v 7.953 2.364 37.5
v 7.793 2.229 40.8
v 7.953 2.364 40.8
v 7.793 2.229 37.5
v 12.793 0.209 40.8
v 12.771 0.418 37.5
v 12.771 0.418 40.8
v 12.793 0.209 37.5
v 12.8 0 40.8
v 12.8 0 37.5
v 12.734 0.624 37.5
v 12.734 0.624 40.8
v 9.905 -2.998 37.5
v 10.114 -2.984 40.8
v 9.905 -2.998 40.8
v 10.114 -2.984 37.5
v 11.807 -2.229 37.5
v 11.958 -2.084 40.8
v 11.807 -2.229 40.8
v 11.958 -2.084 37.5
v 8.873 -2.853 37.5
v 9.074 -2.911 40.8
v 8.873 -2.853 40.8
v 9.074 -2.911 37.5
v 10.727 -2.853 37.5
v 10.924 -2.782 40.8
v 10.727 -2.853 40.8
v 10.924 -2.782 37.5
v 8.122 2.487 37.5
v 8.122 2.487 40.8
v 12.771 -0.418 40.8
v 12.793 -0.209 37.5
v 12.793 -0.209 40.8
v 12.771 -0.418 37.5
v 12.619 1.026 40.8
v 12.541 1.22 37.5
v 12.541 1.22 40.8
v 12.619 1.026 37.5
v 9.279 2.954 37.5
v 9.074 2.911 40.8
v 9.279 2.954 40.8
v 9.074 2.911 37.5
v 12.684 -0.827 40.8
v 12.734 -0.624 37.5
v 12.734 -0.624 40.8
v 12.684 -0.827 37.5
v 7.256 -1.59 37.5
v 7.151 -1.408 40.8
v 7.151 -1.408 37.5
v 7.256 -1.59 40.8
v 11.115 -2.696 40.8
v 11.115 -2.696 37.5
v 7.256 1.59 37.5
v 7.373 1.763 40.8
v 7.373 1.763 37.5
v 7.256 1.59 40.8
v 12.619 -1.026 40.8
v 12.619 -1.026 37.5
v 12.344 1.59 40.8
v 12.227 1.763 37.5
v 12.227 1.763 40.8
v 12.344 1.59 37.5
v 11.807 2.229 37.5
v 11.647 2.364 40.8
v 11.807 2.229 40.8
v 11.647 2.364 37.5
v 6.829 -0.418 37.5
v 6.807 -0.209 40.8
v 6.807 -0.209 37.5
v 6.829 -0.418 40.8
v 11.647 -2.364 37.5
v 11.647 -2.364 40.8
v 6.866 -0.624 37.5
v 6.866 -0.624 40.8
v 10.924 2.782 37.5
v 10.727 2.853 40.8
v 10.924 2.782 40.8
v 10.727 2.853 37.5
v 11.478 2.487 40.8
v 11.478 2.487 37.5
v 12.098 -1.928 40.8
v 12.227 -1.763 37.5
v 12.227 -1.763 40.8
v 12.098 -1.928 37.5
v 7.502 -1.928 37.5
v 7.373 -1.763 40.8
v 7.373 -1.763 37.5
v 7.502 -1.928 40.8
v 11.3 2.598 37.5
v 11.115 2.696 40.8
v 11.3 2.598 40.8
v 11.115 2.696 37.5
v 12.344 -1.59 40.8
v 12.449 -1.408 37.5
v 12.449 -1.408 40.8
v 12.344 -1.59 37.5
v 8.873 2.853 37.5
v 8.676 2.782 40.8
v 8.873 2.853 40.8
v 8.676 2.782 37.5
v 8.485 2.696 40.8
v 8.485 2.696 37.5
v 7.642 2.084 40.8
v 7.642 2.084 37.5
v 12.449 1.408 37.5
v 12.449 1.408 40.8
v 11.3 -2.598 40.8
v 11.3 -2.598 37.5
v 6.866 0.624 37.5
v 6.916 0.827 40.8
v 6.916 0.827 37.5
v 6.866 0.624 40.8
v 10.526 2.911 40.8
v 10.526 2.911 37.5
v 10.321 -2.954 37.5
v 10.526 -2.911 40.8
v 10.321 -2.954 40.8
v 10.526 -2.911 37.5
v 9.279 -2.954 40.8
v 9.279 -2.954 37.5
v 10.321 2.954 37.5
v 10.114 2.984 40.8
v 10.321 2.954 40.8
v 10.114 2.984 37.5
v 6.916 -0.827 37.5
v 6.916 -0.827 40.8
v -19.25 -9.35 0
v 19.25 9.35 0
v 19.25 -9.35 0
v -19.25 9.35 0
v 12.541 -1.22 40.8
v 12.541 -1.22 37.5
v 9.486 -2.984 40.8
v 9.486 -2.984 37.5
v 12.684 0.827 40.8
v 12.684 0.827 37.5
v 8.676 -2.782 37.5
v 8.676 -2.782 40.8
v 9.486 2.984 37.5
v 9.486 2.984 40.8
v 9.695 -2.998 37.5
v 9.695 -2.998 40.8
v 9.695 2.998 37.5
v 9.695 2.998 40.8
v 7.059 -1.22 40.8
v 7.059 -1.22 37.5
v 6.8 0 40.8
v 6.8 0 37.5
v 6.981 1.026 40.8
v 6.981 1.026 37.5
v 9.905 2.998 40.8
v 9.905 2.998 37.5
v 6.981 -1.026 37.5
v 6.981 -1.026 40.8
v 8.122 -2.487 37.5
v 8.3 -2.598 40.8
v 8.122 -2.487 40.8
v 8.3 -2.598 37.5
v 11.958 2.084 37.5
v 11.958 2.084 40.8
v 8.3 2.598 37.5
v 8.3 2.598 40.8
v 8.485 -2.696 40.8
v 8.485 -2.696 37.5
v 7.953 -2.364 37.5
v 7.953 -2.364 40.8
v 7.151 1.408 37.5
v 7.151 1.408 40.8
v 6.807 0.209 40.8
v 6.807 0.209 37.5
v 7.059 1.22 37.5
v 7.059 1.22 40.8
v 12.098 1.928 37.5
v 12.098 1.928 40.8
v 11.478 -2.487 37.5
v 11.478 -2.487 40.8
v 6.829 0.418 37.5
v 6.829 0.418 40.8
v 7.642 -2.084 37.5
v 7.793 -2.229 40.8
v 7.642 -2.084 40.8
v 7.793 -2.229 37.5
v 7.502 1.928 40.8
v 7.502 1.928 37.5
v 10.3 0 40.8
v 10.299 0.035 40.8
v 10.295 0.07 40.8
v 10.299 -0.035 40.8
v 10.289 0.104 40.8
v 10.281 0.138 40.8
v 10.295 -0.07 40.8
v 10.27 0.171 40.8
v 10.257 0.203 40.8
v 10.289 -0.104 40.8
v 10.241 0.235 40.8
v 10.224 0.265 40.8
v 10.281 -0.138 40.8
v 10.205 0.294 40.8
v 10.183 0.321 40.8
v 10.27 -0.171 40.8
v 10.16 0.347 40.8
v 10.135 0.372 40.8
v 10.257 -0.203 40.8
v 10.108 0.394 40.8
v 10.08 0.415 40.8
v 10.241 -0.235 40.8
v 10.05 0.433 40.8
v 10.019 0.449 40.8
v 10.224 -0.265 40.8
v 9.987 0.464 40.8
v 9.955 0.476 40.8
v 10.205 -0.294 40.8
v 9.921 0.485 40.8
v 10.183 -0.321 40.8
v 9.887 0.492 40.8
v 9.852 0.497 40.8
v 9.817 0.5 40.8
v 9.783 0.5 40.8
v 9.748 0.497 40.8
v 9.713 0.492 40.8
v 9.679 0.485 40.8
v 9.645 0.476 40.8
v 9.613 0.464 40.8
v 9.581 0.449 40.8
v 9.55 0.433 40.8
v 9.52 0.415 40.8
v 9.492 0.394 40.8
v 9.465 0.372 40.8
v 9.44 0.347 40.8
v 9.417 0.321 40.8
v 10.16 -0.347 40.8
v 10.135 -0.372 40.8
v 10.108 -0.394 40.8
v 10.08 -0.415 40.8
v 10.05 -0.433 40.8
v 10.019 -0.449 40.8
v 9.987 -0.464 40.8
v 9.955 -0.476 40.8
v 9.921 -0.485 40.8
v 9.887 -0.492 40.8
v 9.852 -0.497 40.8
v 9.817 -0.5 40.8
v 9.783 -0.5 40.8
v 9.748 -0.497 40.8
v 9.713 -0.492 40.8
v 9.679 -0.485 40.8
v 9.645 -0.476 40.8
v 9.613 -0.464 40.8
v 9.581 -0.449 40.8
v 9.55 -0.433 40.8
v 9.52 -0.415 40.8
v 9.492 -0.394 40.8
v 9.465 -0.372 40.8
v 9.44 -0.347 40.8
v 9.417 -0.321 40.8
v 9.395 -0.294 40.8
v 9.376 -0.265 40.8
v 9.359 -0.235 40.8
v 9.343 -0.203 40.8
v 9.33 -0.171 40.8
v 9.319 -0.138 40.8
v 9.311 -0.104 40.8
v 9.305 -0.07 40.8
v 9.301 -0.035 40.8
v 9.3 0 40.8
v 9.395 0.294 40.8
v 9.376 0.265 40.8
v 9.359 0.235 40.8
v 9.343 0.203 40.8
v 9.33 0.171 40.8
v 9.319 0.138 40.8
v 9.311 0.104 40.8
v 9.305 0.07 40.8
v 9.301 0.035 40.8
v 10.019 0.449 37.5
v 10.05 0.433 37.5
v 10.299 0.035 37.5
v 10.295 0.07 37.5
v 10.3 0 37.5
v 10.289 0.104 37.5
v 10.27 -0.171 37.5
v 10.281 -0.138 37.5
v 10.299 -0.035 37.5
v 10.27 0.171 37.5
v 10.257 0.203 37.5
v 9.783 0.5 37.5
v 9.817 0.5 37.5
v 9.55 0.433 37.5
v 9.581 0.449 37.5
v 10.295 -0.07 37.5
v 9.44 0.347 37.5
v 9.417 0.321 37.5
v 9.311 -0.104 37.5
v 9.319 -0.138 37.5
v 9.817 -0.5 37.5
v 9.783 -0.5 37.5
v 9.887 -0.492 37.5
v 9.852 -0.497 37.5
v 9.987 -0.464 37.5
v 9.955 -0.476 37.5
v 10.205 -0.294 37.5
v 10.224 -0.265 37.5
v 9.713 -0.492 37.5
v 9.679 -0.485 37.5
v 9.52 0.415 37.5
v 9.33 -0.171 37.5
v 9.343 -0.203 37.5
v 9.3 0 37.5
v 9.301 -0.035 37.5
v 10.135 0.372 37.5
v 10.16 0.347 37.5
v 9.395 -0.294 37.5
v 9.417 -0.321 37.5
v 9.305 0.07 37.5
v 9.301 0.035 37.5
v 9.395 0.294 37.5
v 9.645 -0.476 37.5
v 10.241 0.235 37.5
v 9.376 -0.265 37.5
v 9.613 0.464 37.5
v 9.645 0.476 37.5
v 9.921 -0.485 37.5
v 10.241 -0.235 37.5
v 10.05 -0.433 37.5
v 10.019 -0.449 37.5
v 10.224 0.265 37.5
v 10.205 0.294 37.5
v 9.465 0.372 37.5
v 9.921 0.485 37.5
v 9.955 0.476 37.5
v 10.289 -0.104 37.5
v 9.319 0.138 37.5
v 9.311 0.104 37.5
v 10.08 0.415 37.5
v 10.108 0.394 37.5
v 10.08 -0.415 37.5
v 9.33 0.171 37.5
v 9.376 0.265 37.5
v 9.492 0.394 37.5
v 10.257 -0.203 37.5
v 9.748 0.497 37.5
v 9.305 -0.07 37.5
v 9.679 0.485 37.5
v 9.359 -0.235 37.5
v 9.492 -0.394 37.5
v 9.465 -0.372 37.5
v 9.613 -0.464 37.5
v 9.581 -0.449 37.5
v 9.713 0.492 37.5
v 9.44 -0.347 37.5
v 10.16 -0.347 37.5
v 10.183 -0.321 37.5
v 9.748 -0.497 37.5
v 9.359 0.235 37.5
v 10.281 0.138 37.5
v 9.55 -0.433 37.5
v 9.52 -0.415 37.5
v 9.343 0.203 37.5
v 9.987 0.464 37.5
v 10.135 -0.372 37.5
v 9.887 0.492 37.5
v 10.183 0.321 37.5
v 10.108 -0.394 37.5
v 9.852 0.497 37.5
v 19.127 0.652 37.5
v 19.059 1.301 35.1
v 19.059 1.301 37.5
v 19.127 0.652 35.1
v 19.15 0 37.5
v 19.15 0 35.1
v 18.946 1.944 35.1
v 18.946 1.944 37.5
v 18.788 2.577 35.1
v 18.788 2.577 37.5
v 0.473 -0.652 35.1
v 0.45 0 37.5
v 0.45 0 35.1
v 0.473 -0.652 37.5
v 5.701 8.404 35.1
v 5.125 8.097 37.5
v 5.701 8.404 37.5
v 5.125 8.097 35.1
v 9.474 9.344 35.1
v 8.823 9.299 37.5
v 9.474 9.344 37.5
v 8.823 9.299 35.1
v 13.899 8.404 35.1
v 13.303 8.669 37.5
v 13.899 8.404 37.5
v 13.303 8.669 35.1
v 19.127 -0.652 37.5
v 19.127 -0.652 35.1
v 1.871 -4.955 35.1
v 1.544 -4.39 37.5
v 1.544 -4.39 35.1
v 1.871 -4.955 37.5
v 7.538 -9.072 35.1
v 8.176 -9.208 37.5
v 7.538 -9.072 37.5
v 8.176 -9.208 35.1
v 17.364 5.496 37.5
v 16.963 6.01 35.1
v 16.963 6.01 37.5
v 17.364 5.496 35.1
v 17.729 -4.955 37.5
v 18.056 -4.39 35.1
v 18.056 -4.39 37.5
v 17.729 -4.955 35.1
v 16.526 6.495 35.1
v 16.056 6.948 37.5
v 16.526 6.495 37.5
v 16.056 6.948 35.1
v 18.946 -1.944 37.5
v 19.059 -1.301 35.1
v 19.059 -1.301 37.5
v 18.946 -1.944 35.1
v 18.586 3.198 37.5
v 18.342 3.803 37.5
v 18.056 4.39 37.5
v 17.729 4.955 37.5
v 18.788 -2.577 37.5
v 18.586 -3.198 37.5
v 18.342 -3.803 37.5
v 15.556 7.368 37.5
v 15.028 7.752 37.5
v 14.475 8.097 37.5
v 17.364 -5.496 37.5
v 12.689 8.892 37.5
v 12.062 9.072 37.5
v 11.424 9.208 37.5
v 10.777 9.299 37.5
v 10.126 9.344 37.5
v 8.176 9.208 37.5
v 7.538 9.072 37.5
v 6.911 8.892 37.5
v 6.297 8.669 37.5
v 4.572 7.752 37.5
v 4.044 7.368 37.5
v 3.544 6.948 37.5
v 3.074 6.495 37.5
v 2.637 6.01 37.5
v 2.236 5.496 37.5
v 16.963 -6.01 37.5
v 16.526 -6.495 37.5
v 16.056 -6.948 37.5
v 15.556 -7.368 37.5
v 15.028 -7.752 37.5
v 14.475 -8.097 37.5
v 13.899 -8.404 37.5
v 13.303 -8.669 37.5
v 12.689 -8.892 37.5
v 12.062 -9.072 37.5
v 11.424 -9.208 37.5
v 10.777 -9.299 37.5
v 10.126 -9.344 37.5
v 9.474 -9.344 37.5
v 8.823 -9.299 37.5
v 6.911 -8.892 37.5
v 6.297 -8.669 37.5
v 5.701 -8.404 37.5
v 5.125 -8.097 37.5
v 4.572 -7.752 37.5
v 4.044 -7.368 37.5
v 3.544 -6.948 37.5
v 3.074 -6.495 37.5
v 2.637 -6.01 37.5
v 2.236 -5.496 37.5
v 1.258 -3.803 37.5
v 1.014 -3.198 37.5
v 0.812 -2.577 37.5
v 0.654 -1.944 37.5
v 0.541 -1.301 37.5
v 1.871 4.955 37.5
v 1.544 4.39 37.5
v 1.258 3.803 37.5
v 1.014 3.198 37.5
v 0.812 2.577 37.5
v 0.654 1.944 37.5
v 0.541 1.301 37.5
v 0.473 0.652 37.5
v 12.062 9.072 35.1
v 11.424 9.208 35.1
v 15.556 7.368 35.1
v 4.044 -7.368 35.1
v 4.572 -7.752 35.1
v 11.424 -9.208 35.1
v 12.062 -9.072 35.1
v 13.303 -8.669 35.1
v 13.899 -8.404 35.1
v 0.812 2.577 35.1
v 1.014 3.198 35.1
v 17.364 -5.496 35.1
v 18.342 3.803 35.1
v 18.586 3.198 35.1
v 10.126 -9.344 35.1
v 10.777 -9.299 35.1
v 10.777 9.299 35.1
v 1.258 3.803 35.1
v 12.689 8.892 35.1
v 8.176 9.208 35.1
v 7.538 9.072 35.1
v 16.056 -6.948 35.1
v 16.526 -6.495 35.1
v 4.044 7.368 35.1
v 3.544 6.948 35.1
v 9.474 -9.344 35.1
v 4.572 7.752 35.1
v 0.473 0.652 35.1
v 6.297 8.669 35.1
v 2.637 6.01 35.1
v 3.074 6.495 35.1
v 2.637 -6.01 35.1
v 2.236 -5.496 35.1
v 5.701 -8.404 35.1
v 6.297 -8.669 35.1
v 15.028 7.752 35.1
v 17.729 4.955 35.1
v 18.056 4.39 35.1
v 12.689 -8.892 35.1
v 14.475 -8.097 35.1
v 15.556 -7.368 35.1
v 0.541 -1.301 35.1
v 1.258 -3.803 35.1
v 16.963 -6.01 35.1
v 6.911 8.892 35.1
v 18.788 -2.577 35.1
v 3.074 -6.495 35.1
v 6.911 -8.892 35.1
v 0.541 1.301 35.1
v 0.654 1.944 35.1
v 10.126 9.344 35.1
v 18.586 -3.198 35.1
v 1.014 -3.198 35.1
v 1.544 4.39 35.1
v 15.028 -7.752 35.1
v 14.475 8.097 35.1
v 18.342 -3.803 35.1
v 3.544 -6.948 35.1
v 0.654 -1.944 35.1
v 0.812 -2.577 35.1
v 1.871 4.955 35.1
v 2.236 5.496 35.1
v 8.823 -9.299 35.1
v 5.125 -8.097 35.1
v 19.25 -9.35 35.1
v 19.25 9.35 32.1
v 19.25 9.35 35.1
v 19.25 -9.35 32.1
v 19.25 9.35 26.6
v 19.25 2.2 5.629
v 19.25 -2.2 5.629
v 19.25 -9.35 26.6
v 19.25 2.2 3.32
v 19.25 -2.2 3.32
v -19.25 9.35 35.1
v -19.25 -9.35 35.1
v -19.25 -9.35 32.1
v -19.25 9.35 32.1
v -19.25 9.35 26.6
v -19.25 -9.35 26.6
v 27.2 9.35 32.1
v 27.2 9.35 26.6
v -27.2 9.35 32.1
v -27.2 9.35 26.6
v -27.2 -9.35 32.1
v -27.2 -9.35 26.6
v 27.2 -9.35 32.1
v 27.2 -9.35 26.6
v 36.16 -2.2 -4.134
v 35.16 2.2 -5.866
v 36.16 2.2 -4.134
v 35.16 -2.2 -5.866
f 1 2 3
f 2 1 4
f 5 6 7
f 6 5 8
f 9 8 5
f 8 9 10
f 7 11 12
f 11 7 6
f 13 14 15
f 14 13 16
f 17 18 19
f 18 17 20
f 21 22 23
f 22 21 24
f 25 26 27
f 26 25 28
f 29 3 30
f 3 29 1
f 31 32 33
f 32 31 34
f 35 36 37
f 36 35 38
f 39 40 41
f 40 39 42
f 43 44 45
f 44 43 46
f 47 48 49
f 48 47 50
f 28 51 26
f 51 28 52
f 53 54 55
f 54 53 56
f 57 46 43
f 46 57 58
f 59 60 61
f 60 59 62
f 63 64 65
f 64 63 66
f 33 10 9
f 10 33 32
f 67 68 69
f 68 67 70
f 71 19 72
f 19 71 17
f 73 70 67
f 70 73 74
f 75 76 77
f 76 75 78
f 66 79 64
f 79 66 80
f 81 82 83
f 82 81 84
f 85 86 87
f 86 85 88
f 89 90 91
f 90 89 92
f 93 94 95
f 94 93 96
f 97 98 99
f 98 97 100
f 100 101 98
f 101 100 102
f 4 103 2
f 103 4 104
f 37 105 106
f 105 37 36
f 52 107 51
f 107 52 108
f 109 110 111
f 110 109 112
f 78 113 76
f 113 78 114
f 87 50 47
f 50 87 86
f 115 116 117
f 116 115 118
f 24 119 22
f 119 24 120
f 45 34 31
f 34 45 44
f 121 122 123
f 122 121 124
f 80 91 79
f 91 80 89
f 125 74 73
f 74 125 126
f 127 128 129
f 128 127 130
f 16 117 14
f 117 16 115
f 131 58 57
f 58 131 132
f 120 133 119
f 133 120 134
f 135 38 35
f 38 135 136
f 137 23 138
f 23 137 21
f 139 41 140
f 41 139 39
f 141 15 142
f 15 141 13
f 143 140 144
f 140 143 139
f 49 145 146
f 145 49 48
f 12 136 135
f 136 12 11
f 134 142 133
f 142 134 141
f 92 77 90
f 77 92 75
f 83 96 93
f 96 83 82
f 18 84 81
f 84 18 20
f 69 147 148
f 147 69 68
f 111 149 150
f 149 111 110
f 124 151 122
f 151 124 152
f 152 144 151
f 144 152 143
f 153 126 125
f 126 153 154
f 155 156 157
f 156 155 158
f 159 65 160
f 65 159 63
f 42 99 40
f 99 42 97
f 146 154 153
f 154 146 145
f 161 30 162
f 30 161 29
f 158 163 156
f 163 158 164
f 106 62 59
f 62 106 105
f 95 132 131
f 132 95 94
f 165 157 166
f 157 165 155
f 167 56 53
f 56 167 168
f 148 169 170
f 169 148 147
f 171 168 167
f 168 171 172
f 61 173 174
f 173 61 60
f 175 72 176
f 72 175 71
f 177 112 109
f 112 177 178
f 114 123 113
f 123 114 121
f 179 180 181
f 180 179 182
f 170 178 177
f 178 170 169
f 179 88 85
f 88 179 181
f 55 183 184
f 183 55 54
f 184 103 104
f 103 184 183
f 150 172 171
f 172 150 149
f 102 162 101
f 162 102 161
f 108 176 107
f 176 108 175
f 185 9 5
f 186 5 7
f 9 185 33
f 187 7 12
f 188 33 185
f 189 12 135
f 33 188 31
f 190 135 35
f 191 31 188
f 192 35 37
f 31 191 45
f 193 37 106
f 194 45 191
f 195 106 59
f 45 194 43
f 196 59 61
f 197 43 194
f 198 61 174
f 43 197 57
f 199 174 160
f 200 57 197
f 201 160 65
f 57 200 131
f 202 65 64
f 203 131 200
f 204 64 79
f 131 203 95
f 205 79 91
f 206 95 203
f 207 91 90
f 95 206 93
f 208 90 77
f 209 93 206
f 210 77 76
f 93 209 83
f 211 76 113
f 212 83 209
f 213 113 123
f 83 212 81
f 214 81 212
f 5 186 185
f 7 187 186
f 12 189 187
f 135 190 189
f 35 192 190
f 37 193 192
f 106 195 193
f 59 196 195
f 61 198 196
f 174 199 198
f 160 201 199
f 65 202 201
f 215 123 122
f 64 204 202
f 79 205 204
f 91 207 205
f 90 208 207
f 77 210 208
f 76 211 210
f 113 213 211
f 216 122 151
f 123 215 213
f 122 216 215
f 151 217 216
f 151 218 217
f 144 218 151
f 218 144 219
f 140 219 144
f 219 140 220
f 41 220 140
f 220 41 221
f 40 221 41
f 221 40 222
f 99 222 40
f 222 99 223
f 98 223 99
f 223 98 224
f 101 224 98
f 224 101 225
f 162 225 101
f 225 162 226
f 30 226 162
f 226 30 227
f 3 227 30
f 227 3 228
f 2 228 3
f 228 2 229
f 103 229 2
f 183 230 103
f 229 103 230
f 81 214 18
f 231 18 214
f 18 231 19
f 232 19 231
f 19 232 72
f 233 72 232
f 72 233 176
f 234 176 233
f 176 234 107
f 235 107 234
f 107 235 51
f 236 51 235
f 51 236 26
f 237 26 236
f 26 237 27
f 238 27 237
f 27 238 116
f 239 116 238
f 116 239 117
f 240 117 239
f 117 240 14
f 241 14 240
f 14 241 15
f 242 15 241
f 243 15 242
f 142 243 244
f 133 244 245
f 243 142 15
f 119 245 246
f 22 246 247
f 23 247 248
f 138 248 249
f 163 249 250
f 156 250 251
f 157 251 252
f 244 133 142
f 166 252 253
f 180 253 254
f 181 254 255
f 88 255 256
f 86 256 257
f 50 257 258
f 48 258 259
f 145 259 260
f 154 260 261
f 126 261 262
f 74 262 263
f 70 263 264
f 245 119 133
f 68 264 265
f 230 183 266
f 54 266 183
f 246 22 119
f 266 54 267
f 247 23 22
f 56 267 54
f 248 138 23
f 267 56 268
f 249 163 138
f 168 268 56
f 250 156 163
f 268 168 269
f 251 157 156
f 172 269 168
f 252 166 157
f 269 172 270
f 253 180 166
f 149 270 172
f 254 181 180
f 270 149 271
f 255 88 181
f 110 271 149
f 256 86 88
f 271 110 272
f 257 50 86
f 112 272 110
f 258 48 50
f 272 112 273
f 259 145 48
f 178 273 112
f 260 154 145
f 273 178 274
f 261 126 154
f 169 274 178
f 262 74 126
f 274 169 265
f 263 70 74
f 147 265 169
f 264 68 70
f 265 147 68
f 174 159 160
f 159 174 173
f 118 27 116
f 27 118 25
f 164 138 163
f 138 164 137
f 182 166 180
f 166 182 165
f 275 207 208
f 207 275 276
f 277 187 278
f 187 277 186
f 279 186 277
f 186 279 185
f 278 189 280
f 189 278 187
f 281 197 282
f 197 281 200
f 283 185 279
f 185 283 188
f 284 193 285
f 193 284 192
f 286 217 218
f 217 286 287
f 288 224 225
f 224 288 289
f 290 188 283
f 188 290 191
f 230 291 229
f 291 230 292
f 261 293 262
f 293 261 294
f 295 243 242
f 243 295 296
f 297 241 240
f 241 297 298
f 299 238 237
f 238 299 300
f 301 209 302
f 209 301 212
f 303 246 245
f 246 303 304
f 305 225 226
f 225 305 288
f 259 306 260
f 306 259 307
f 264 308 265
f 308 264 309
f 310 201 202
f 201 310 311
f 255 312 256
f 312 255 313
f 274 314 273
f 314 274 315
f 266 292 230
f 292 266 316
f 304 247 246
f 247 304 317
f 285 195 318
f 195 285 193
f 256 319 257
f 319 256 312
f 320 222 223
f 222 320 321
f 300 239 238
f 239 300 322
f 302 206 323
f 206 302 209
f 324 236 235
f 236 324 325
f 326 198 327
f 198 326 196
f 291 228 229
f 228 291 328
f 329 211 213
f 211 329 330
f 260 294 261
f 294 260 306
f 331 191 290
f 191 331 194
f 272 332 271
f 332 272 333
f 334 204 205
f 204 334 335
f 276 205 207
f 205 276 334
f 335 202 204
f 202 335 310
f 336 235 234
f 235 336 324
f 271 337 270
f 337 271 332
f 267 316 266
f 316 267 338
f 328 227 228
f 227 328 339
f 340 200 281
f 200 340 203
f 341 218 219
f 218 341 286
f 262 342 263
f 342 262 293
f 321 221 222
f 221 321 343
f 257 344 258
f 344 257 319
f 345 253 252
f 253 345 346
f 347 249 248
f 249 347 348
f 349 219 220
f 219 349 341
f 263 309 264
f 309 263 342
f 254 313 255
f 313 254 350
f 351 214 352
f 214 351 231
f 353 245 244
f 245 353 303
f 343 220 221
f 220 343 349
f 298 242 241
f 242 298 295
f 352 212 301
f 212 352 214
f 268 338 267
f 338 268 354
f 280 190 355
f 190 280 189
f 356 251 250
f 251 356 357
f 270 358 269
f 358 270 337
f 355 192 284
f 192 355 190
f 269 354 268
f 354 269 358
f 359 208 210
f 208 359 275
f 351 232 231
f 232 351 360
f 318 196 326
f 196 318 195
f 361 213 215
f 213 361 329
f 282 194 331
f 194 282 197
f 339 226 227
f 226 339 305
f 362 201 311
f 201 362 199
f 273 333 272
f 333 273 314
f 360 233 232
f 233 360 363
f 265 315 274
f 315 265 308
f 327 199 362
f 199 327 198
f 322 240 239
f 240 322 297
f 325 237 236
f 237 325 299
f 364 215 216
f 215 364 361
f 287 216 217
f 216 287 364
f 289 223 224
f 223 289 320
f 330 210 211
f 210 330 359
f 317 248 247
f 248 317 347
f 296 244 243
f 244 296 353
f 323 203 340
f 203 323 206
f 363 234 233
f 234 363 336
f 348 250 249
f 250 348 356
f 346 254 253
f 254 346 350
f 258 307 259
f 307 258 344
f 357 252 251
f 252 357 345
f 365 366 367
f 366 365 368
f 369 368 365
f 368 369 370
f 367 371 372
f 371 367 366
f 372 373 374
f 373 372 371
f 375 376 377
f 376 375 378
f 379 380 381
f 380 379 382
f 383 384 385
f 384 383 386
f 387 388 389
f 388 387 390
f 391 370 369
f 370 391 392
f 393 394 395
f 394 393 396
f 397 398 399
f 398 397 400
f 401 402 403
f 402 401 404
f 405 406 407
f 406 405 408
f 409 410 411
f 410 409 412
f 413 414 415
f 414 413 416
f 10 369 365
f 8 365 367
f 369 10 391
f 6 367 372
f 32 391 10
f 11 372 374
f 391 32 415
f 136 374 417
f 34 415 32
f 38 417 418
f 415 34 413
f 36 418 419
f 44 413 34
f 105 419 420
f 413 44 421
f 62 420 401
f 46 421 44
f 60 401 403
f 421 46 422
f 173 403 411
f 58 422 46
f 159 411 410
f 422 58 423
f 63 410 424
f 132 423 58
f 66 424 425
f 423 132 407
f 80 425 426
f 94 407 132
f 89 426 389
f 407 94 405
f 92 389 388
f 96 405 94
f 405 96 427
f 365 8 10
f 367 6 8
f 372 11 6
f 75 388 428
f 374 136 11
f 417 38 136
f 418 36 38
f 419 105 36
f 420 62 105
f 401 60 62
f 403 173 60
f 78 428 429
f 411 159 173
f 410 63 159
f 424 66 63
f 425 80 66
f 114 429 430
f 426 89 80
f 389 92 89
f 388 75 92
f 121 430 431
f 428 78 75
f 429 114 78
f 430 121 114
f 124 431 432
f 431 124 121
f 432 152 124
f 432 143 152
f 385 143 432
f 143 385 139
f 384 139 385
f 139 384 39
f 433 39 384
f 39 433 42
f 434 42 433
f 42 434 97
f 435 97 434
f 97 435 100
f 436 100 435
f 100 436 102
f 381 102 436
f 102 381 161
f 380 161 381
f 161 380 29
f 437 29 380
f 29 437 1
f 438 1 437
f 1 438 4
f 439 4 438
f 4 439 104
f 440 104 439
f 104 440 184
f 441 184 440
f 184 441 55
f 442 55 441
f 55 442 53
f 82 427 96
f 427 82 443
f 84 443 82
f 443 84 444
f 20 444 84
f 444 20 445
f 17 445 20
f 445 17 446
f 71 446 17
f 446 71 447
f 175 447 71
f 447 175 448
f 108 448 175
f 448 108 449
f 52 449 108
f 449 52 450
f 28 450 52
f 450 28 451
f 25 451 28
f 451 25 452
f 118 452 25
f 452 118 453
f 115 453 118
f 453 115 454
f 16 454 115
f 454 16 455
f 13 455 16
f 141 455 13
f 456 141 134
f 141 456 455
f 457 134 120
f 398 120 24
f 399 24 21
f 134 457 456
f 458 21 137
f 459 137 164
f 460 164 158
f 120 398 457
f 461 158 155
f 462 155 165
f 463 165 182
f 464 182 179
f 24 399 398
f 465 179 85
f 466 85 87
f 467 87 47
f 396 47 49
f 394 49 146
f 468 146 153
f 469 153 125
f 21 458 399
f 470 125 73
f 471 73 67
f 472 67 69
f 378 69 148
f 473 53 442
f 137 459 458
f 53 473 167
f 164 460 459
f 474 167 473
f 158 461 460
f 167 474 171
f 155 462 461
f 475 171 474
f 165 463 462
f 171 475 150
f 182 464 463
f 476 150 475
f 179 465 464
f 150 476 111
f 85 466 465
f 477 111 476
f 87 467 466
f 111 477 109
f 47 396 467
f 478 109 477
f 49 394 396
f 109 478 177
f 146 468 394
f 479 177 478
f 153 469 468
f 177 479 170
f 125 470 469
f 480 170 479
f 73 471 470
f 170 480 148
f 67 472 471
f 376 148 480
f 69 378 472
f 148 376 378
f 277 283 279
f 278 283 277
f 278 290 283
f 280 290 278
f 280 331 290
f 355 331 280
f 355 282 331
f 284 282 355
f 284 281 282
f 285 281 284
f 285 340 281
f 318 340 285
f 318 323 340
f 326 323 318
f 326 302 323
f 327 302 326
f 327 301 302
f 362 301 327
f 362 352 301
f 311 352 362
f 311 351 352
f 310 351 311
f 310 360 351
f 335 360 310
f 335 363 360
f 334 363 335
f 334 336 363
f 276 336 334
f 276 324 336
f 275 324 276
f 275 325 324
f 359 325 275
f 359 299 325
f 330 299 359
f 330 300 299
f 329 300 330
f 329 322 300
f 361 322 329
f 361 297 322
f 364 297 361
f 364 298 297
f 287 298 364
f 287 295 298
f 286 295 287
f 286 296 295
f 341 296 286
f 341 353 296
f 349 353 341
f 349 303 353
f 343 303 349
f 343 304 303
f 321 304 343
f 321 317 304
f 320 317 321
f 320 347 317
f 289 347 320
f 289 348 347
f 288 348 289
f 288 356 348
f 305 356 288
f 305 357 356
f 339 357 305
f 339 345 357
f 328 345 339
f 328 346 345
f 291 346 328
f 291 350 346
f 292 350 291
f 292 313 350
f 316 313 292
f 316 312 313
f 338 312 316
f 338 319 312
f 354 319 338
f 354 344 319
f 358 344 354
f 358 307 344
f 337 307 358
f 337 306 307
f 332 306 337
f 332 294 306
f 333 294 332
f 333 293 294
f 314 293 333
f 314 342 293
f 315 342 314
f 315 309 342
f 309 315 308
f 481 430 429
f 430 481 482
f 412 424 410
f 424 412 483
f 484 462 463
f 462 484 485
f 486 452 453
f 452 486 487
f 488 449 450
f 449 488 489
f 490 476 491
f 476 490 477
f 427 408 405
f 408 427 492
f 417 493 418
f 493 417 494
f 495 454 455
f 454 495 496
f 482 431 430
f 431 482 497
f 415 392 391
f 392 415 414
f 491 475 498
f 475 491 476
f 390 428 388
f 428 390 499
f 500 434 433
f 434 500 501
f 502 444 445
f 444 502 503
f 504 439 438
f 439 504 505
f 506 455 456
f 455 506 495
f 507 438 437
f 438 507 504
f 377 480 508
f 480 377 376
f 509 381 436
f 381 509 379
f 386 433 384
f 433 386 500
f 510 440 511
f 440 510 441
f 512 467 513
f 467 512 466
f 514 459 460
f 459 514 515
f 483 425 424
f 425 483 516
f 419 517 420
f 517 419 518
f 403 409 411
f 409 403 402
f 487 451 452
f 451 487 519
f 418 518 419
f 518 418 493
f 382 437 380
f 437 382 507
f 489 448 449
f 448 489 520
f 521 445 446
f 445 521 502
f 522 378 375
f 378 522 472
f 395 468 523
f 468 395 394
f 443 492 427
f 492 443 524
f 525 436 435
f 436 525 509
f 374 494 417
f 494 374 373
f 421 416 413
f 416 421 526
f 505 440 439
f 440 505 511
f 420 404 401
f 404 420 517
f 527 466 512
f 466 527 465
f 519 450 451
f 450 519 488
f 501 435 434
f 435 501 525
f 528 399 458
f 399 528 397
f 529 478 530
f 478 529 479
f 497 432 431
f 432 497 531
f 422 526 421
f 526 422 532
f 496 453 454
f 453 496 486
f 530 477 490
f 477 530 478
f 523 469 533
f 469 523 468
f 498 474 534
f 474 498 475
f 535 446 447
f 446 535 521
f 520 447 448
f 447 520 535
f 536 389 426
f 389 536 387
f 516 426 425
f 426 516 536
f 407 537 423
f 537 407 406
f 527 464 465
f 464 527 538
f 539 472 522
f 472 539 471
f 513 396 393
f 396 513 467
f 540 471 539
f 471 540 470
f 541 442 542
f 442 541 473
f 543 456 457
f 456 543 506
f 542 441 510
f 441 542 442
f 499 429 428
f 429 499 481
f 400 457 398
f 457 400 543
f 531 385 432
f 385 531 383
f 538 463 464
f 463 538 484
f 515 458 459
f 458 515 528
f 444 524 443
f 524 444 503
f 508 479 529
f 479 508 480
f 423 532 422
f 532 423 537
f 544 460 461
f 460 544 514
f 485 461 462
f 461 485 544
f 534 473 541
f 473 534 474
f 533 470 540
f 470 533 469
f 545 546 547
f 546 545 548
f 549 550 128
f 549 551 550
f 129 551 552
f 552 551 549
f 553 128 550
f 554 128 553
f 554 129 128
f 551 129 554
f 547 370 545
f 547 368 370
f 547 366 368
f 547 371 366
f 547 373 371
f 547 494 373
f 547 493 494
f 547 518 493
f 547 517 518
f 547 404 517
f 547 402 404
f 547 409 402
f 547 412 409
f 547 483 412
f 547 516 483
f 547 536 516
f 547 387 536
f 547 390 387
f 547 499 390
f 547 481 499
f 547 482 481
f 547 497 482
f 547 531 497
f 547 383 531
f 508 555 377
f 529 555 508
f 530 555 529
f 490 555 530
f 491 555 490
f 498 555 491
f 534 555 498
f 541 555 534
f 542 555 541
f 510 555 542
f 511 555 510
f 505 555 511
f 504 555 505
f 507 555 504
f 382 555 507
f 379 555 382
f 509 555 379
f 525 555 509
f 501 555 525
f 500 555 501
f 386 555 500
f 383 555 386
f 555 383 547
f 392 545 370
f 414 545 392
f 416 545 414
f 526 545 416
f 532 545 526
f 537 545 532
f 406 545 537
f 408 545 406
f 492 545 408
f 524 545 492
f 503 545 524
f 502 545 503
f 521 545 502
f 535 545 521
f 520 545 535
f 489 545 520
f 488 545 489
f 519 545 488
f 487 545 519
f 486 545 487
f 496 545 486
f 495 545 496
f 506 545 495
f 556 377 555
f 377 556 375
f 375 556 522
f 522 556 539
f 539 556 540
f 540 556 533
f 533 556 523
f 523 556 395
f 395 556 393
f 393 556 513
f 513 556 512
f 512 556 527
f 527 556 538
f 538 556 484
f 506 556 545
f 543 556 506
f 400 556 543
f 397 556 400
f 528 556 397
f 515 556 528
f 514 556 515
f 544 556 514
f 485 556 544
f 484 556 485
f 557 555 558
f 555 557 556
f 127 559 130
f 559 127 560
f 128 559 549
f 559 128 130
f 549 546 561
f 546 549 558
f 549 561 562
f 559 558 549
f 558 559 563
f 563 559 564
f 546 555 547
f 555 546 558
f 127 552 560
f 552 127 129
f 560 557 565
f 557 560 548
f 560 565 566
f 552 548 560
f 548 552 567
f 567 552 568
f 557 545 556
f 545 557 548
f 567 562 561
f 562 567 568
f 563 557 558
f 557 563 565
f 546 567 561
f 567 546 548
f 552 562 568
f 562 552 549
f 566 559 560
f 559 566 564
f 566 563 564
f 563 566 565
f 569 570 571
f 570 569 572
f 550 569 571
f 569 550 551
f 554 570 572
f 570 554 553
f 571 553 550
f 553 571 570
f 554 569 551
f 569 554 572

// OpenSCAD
$fn = 90;

servo();

module servo(color = "#81a2be"){
	color(color){
		width = 18.7;
		
		mainBlock(width);
		axis(width);
		mounting(width);
		wire();
	}
	
	module mainBlock(width){
		length = 38.5;
		height = 35.1;
		translate([-length/2, -width/2, 0])
			cube([length, width, height]);
	}
	
	module axis(width){
		translate([9.8, 0, 0]){
			cylinder(d=width, h=37.5);
			difference(){
				cylinder(d=6, h=40.8);
				#cylinder(d=1, h=50);
			}
		}
	}
	
	module mounting(width){
		length = 54.4;
		translate([-length/2, -width/2, 26.6])
			cube([54.4, width, 5.5]);
	}
	
	
	module wire(){
		translate([27, 0, 0])
			rotate([0, 30, 0])
				cube([20, 4.4, 2], center=true);
	}
}
